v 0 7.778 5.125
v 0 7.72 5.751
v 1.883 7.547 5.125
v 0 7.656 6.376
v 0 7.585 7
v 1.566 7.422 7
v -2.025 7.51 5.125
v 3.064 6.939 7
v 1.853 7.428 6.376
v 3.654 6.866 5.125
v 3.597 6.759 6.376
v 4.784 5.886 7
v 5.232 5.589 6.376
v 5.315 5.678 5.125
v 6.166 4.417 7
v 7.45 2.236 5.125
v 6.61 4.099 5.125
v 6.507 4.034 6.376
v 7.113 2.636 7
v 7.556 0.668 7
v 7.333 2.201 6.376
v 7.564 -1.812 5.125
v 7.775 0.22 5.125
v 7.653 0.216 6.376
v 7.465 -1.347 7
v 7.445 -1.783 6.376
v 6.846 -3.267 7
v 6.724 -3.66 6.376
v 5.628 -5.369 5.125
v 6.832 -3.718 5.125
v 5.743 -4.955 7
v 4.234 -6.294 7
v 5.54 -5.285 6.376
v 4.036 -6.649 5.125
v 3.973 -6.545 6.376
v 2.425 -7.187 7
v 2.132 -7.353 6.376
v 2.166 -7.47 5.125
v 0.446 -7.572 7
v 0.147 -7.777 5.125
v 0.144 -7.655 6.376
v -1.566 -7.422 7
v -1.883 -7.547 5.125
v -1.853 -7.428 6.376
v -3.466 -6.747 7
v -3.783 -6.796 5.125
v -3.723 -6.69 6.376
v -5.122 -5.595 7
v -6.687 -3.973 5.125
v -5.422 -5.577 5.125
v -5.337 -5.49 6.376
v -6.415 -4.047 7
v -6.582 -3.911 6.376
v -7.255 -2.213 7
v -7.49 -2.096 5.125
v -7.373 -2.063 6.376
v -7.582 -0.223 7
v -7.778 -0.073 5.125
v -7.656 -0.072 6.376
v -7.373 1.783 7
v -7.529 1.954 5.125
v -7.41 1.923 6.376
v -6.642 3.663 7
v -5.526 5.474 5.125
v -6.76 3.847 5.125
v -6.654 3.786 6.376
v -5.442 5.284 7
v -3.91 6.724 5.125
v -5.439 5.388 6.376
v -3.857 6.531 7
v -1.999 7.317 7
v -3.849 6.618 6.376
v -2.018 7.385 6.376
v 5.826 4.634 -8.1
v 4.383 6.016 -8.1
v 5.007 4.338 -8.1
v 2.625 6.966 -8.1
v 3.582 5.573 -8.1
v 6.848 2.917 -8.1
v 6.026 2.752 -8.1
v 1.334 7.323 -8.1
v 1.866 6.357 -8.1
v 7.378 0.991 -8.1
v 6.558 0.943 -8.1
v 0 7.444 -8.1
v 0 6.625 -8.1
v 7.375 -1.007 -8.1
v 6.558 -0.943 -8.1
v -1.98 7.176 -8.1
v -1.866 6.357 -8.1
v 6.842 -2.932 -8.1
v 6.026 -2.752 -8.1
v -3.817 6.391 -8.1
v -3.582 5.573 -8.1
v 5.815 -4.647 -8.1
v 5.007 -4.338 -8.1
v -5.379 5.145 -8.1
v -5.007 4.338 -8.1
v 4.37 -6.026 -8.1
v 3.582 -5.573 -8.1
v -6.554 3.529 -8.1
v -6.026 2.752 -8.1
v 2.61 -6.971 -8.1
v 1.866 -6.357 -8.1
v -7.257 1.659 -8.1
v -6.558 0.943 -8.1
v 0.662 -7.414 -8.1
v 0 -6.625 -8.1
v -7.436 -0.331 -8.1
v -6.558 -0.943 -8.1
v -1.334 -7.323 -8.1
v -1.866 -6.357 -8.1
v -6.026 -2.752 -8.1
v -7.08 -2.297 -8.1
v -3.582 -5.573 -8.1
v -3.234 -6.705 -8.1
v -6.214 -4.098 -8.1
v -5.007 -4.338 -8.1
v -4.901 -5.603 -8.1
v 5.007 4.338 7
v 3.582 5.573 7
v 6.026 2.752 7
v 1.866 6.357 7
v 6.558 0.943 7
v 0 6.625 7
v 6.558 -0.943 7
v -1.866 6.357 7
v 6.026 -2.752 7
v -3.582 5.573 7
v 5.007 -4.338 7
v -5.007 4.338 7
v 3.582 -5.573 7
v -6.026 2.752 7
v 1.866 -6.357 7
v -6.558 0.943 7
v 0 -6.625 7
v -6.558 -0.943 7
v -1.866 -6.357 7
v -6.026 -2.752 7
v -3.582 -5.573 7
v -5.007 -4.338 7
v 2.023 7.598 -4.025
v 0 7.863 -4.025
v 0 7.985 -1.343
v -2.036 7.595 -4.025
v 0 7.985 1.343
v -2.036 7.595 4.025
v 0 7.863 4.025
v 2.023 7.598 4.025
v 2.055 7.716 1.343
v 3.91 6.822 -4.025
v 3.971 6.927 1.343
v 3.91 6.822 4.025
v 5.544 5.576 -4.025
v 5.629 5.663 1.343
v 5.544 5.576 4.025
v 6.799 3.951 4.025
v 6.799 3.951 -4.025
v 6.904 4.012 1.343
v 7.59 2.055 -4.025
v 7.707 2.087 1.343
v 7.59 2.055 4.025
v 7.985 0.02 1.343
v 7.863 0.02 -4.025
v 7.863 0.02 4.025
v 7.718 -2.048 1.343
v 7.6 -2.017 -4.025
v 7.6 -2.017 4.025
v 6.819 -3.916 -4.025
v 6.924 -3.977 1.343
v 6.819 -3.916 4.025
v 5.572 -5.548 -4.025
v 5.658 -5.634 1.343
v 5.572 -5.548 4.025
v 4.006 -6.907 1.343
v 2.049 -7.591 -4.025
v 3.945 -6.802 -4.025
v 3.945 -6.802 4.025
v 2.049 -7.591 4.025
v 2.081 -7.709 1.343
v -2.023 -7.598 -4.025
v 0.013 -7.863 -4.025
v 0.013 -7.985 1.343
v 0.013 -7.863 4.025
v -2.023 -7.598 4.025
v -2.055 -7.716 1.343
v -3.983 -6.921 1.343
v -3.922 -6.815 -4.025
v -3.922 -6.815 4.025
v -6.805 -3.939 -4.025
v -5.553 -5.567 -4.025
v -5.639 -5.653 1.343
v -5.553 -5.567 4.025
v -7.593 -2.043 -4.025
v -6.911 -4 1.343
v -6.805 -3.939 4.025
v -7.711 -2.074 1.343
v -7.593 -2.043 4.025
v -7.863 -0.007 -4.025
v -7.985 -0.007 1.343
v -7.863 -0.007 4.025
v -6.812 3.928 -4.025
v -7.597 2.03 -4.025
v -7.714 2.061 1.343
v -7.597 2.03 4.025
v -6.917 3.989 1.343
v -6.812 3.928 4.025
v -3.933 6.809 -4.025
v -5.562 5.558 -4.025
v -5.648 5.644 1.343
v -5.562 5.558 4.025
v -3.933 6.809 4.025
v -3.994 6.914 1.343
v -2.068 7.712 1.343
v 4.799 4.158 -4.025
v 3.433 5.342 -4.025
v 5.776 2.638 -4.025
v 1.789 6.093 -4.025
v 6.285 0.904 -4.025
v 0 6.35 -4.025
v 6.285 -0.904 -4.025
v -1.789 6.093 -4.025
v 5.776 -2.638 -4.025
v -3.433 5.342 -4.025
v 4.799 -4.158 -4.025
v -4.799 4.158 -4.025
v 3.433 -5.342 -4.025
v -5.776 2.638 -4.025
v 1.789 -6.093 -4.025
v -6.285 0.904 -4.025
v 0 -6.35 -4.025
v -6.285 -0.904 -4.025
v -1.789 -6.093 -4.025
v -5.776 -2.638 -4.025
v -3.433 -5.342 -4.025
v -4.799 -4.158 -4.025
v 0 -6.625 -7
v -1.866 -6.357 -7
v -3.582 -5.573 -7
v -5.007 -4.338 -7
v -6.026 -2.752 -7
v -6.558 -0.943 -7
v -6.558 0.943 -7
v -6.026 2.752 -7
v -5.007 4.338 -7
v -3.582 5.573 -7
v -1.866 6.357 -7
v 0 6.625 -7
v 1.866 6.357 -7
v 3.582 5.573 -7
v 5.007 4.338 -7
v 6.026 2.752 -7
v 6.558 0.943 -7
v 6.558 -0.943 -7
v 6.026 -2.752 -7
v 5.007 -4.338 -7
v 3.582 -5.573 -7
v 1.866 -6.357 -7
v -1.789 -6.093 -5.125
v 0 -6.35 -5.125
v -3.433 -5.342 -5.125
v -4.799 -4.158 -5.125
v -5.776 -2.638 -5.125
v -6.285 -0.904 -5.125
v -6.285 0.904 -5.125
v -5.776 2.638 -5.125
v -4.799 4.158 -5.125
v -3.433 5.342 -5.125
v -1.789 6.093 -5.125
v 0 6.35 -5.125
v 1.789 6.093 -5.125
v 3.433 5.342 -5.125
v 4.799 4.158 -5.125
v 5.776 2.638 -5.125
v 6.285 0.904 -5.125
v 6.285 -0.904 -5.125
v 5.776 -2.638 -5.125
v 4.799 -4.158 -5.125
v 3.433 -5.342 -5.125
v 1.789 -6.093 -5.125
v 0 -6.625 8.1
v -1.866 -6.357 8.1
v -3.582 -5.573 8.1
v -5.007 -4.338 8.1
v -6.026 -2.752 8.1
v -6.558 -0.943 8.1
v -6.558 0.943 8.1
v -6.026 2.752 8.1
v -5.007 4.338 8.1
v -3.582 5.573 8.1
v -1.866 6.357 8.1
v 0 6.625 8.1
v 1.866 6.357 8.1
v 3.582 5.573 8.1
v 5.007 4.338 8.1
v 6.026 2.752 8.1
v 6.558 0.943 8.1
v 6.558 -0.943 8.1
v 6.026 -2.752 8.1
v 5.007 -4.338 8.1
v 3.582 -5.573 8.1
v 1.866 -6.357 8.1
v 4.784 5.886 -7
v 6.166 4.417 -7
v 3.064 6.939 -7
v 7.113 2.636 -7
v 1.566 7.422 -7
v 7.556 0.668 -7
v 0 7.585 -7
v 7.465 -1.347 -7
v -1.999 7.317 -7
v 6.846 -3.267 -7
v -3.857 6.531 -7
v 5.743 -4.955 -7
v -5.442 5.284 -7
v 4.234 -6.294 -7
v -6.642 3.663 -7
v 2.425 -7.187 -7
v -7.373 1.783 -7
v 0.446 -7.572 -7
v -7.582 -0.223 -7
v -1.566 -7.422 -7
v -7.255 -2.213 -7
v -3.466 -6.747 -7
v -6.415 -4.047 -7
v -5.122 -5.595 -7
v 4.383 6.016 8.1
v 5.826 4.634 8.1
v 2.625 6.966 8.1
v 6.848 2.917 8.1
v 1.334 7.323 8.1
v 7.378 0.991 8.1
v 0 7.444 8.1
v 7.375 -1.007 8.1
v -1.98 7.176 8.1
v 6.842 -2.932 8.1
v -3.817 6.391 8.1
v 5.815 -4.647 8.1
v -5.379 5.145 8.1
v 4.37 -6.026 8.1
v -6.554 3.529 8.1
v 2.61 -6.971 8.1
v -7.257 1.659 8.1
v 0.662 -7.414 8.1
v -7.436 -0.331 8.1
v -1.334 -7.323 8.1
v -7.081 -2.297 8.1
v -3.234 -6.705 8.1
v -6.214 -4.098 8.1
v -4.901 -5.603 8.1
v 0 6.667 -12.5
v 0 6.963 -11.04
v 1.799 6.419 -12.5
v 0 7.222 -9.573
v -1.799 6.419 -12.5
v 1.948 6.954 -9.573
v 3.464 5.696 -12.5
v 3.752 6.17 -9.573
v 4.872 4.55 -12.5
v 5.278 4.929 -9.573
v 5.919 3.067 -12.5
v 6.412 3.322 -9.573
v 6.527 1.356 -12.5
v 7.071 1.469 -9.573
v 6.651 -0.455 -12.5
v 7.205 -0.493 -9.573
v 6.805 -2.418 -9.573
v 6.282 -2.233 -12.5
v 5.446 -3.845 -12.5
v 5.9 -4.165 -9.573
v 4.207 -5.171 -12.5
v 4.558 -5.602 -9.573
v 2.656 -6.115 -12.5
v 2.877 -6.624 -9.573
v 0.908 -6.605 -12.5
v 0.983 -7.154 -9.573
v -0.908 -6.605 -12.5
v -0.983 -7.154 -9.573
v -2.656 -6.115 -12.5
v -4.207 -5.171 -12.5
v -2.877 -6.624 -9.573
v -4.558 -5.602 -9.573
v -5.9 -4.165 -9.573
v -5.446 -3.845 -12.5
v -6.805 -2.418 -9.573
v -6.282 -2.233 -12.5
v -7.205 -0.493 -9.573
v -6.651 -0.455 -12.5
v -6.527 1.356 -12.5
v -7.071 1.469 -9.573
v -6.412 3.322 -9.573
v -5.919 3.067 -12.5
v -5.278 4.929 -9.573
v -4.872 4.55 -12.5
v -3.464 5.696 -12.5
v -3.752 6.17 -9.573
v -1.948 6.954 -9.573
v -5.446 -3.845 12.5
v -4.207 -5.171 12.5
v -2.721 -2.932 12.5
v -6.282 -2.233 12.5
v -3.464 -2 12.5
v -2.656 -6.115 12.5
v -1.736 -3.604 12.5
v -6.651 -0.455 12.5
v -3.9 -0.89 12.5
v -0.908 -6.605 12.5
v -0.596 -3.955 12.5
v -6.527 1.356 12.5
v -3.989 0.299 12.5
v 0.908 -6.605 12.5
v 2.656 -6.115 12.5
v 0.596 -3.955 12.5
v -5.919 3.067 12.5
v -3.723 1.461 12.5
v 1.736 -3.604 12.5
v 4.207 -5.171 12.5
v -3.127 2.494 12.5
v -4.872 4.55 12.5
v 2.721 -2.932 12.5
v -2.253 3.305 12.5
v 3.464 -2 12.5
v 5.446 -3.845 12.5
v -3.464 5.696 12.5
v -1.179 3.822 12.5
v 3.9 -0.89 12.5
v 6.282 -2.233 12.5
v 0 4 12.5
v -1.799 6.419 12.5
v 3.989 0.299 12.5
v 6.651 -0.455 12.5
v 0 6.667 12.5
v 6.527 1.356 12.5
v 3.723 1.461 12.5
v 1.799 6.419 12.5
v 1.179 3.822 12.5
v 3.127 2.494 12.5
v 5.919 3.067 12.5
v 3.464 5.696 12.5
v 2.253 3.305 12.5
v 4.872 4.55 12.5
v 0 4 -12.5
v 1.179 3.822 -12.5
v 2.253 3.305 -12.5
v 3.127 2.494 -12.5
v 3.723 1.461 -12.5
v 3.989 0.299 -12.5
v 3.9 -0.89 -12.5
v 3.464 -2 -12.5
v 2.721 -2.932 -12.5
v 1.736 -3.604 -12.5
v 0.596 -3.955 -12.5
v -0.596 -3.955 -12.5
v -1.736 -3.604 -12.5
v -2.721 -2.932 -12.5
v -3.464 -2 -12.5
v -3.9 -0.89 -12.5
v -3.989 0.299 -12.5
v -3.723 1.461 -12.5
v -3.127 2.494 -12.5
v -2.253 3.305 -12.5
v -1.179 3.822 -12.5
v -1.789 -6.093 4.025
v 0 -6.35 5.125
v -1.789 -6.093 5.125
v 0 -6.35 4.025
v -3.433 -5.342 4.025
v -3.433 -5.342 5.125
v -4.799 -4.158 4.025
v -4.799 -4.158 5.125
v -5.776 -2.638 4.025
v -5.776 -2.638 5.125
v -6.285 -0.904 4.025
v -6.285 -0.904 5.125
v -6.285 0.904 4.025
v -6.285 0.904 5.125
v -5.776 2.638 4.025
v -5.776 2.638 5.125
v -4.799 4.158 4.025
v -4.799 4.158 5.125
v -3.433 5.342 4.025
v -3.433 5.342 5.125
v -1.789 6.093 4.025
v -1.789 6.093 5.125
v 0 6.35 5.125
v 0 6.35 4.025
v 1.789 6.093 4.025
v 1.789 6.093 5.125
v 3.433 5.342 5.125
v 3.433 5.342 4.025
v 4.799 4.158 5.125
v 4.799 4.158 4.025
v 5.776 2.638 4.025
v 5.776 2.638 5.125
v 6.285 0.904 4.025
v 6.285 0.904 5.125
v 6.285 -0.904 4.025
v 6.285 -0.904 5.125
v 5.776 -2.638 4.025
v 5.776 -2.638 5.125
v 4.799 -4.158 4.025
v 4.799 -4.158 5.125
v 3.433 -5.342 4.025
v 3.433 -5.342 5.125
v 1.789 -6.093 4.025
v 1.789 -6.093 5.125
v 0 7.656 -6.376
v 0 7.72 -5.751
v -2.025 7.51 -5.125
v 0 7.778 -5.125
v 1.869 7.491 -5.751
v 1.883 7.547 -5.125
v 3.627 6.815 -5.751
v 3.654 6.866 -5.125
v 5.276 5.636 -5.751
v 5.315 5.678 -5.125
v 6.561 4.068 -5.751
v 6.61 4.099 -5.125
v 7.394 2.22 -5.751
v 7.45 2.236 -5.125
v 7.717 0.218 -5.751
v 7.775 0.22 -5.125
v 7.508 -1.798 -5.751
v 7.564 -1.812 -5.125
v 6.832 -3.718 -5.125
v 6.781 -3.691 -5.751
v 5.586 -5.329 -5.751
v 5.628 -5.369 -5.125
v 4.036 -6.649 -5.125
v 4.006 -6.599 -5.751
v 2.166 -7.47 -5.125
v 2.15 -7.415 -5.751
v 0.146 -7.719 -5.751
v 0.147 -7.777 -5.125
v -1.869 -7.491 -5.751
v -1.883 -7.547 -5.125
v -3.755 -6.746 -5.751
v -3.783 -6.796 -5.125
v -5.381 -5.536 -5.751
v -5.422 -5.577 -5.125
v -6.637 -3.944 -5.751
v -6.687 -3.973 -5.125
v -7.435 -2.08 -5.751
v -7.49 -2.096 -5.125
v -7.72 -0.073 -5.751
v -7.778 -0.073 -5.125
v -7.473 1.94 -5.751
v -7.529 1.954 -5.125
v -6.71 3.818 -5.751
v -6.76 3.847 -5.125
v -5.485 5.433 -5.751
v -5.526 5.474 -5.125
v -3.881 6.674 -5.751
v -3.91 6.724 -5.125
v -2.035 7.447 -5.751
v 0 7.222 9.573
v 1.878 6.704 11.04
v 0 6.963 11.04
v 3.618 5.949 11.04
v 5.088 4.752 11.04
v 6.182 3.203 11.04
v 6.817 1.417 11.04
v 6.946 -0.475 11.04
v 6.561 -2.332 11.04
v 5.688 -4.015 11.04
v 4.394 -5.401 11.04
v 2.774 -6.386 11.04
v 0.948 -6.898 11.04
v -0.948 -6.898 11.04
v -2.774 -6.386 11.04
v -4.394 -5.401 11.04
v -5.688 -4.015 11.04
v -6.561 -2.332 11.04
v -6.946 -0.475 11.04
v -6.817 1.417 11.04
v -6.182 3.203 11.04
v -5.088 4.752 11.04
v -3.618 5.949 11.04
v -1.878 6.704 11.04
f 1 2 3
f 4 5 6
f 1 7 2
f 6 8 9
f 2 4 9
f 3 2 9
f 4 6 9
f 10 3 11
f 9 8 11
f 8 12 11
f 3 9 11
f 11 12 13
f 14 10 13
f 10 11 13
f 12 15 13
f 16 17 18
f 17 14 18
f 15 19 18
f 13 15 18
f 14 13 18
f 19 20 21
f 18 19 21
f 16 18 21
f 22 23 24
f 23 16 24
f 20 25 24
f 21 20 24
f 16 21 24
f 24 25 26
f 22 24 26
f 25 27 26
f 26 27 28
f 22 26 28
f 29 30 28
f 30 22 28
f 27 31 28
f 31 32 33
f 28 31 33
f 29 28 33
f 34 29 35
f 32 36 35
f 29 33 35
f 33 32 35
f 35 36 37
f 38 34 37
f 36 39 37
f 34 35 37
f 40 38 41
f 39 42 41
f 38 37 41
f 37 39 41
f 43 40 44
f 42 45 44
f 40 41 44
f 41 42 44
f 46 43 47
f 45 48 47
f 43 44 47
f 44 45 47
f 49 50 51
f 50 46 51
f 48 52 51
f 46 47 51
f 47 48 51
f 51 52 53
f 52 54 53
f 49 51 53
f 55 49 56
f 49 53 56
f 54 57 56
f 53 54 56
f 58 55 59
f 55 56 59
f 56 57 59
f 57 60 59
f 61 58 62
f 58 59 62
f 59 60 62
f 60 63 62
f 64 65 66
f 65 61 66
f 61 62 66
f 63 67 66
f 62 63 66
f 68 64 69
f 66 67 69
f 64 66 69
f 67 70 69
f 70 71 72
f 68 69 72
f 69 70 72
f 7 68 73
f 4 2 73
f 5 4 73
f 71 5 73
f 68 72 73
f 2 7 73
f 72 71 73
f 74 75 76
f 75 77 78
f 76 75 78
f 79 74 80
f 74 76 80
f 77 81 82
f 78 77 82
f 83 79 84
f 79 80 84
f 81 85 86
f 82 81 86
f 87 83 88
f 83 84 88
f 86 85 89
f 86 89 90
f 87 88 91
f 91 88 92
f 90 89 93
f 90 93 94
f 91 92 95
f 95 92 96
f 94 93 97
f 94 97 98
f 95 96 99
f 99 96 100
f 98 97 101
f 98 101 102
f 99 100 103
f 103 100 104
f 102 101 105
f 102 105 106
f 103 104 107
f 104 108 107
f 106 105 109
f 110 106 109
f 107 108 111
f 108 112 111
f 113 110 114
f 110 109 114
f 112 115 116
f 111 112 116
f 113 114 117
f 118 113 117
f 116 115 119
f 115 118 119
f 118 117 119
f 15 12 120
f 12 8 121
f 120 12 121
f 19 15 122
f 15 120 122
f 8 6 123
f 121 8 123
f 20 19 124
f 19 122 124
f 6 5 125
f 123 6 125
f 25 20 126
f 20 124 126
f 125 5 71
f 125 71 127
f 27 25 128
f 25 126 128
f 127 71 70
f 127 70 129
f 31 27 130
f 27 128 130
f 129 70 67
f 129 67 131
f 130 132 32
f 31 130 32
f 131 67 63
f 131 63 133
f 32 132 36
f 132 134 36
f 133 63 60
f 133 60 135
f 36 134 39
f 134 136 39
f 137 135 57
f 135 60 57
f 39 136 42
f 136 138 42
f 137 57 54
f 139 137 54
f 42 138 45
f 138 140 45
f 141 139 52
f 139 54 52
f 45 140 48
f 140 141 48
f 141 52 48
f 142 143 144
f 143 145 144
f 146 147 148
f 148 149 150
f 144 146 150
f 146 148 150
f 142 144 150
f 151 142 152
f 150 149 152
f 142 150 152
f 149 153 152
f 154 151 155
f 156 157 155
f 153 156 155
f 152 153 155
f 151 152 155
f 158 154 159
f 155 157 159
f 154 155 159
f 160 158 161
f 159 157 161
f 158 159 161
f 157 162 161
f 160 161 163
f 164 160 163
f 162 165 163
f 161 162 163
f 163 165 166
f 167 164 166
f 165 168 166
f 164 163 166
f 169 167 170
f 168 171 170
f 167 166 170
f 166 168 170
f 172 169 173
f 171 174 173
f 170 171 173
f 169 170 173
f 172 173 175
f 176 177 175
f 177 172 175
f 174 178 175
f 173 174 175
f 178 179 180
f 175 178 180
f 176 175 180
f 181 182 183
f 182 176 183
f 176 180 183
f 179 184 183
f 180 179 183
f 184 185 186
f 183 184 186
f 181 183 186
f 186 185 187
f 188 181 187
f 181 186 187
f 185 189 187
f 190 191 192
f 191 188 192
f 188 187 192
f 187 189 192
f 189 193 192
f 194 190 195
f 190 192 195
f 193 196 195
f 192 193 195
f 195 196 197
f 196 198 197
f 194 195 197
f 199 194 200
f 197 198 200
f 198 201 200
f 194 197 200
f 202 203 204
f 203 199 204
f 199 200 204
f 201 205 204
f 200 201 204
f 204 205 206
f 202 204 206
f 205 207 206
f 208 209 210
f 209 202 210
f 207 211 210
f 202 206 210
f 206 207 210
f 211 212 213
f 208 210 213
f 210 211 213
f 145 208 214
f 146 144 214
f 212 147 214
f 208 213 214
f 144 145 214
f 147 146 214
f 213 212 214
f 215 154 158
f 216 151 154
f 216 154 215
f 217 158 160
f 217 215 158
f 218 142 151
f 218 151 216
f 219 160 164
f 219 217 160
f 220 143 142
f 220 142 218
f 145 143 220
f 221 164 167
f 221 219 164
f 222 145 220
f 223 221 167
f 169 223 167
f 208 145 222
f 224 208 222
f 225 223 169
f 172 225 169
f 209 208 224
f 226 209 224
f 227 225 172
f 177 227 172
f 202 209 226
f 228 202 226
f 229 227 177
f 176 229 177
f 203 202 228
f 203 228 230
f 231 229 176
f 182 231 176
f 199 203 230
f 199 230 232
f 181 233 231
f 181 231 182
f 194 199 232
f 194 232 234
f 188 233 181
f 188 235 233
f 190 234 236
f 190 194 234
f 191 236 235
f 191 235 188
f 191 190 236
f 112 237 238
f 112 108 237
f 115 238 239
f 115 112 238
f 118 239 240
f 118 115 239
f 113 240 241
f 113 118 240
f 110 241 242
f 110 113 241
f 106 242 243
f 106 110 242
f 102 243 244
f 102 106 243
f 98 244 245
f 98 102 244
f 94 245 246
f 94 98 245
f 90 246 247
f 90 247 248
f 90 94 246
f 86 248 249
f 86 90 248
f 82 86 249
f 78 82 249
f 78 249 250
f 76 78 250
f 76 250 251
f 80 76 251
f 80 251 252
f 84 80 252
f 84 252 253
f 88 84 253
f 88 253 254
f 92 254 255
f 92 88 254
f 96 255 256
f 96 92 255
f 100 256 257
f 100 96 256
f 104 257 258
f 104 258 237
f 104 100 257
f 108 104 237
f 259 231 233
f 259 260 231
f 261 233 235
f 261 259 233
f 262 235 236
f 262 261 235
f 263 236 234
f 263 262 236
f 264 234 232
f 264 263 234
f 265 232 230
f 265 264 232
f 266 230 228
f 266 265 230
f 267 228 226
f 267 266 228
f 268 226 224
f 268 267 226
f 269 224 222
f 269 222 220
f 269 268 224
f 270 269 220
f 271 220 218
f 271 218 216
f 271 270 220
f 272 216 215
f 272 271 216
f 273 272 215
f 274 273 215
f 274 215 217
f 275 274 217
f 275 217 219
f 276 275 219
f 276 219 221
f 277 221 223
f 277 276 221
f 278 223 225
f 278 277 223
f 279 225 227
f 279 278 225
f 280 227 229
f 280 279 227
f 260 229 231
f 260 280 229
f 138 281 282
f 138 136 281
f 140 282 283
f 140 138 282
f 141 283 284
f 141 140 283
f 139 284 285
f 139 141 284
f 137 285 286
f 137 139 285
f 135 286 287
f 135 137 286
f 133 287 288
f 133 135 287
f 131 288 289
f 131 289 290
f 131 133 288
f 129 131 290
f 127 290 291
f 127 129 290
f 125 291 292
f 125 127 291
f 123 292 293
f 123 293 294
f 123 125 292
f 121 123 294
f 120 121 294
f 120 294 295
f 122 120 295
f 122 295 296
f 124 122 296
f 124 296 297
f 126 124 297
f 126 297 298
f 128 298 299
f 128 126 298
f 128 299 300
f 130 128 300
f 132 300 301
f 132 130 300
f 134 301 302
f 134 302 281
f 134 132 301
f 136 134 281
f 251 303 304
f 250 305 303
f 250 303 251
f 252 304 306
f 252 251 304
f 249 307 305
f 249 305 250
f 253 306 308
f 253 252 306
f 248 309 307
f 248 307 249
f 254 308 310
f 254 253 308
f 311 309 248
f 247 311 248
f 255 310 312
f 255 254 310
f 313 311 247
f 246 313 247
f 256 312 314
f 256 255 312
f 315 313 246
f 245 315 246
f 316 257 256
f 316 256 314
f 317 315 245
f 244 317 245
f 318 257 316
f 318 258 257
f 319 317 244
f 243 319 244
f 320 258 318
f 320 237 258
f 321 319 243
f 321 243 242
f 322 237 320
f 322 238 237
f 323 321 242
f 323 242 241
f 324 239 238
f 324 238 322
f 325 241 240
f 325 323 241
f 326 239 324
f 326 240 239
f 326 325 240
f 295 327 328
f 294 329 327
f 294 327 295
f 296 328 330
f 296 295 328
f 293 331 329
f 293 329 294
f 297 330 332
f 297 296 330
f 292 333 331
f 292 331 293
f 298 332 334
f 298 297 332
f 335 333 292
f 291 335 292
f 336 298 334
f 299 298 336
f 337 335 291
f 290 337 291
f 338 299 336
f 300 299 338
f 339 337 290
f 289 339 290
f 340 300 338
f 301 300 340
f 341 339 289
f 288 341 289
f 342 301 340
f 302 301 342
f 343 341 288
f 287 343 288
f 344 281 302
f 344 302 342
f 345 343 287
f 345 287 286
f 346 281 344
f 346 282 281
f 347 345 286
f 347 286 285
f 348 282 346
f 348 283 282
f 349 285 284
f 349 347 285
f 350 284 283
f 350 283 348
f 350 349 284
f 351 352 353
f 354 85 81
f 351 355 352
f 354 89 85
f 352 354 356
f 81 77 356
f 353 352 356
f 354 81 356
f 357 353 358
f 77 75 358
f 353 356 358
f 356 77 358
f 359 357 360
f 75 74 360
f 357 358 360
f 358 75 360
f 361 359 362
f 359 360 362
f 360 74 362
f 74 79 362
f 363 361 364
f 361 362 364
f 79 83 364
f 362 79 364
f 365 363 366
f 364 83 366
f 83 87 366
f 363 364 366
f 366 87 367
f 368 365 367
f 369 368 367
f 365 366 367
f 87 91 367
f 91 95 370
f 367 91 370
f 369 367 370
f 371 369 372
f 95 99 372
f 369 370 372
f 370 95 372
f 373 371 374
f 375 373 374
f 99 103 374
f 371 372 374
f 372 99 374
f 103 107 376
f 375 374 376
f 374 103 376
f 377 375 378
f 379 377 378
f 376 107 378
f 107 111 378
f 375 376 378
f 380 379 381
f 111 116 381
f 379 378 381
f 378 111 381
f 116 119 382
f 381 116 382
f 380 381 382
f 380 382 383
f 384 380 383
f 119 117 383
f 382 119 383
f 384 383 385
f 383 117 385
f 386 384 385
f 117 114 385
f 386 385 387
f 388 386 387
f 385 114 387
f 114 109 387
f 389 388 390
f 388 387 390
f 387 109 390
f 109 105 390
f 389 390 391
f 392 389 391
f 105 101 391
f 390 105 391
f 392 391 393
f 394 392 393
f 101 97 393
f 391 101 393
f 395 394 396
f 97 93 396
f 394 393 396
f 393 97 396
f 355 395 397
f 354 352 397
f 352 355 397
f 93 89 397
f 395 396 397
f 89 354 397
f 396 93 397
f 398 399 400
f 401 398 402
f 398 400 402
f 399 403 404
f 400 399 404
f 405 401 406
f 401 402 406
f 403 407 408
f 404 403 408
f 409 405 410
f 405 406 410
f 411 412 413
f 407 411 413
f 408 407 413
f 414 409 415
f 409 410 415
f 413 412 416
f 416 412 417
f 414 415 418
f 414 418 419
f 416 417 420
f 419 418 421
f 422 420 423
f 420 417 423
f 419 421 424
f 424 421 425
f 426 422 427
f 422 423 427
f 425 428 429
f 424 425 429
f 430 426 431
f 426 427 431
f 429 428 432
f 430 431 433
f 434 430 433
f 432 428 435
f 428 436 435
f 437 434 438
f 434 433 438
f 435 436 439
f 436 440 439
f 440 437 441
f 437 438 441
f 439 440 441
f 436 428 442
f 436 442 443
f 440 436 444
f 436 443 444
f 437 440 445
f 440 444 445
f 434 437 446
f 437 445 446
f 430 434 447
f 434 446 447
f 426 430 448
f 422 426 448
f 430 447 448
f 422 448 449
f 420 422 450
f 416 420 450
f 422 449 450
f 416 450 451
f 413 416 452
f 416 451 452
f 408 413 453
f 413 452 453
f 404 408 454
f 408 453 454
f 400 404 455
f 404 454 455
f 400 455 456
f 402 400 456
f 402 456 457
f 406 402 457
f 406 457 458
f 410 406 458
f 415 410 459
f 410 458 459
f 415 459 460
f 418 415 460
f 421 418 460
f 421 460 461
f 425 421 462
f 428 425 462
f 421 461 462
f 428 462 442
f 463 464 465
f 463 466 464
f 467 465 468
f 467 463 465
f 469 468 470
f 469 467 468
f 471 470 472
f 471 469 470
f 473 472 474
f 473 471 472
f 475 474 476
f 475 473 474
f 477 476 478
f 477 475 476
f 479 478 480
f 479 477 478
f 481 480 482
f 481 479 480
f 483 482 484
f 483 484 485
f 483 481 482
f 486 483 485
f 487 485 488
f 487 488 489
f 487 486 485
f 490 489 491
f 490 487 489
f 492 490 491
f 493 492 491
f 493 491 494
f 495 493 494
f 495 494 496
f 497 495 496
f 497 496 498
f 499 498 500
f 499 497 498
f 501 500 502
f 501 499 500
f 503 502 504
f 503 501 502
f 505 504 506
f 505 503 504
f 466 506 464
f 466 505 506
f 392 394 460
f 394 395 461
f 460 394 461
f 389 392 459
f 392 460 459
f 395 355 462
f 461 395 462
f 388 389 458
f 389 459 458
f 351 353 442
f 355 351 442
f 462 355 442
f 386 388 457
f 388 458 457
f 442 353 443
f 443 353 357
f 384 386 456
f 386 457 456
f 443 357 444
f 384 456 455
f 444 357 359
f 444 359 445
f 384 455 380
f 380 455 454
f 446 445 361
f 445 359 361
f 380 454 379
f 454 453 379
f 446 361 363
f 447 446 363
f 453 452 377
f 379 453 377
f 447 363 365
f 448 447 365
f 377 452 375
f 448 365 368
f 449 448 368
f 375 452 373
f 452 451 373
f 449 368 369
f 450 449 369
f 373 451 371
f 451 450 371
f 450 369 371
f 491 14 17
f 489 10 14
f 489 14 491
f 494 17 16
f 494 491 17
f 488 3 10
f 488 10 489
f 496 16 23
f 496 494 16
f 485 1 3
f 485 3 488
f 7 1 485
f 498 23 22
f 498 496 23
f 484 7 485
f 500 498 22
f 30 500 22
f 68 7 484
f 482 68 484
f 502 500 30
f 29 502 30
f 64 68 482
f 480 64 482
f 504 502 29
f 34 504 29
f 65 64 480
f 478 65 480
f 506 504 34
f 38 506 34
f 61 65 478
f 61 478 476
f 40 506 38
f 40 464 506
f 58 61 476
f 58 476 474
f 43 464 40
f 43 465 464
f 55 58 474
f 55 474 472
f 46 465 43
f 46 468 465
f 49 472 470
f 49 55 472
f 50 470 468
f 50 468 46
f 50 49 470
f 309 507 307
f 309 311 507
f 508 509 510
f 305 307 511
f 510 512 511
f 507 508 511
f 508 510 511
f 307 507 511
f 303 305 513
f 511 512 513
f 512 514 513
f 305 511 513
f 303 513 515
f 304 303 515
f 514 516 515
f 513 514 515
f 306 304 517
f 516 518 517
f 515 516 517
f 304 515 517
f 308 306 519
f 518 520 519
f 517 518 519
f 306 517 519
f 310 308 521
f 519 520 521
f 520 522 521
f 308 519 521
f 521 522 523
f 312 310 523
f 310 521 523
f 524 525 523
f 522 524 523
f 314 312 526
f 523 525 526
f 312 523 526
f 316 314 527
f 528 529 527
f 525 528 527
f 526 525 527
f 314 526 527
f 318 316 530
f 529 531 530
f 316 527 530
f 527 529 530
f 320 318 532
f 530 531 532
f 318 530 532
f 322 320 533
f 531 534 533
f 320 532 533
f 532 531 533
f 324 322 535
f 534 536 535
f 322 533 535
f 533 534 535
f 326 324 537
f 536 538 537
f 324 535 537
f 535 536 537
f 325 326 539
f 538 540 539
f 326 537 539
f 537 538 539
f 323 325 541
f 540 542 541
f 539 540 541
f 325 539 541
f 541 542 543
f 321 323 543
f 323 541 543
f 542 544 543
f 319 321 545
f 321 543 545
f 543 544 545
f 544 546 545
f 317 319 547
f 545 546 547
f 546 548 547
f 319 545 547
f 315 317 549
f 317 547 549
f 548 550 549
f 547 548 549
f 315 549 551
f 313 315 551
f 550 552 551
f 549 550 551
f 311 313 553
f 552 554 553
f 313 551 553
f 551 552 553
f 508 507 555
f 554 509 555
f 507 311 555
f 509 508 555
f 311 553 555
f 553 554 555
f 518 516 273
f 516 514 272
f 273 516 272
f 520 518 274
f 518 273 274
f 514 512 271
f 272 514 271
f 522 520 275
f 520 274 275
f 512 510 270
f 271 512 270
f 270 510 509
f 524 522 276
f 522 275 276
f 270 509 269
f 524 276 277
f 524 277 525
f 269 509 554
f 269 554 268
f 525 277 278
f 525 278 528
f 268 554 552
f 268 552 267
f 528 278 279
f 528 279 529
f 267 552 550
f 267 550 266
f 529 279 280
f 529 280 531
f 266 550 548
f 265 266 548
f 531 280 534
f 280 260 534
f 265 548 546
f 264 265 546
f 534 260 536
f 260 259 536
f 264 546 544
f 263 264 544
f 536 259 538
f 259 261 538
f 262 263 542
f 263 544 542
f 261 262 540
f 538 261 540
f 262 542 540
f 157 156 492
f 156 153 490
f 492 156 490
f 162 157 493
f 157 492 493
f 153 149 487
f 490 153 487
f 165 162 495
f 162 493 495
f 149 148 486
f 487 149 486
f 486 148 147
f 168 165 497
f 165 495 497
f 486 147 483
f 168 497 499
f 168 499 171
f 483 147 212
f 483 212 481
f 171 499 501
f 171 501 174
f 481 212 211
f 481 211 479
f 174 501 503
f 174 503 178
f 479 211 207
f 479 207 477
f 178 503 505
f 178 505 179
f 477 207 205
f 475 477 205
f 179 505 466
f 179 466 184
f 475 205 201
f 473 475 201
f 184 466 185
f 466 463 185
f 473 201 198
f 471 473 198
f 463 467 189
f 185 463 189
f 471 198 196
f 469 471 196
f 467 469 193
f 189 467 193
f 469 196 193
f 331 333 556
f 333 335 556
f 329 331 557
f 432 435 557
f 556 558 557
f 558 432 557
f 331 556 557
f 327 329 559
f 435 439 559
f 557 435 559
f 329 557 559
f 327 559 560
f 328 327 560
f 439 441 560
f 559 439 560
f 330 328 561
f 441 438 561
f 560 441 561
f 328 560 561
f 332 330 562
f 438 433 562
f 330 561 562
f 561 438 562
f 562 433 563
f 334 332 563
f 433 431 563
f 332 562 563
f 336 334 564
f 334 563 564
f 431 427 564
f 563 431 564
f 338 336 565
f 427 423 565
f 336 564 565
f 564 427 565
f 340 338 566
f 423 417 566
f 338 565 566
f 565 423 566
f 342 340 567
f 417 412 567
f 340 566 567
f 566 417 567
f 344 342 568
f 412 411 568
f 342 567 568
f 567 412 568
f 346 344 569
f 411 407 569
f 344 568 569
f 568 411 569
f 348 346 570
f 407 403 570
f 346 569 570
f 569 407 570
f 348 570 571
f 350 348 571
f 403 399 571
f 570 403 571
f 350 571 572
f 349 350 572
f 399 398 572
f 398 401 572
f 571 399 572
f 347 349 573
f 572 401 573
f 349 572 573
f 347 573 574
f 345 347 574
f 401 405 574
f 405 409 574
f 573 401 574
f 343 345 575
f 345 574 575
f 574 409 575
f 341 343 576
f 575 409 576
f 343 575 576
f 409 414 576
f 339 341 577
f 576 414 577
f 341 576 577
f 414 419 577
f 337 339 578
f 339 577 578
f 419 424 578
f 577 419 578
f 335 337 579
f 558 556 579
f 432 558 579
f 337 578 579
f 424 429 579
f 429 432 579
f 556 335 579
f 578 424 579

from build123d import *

# Parameters (mm, degrees)
SKETCH4_W   = 1.1
SKETCH4_H   = 1.375
SKETCH4_H_2 = 1.65


with BuildPart() as part:
    # Sketch5 → Revolve1 (revolve)
    with BuildSketch(Plane(origin=(0, 0, 0), x_dir=(0, 0, -1), z_dir=(1, 0, 0))):
        with BuildLine():
            Line((-12.5, 4), (12.5, 4))
            Line((12.5, 4), (12.5, 6.666666667))
            ThreePointArc((12.5, 6.666666667), (0, 8), (-12.5, 6.666666667))
            Line((-12.5, 6.666666667), (-12.5, 4))
        make_face()
    revolve(axis=Axis((0, 0, 12.5), (0, 0, -1)))

    # Sketch4 → Cut-Revolve1 (revolve, cut)
    with BuildSketch(Plane(origin=(0, 0, 0), x_dir=(0, 0, -1), z_dir=(1, 0, 0))):
        with Locations((-7.55, -7.3125)):
            Rectangle(SKETCH4_W, SKETCH4_H)
        with Locations((7.55, -7.3125)):
            Rectangle(SKETCH4_W, SKETCH4_H)
        with Locations((-4.575, -7.175)):
            Rectangle(SKETCH4_W, SKETCH4_H_2)
        with Locations((4.575, -7.175)):
            Rectangle(SKETCH4_W, SKETCH4_H_2)
    revolve(axis=Axis((0, 0, 12.5), (0, 0, -1)), mode=Mode.SUBTRACT)


solid = part.part
